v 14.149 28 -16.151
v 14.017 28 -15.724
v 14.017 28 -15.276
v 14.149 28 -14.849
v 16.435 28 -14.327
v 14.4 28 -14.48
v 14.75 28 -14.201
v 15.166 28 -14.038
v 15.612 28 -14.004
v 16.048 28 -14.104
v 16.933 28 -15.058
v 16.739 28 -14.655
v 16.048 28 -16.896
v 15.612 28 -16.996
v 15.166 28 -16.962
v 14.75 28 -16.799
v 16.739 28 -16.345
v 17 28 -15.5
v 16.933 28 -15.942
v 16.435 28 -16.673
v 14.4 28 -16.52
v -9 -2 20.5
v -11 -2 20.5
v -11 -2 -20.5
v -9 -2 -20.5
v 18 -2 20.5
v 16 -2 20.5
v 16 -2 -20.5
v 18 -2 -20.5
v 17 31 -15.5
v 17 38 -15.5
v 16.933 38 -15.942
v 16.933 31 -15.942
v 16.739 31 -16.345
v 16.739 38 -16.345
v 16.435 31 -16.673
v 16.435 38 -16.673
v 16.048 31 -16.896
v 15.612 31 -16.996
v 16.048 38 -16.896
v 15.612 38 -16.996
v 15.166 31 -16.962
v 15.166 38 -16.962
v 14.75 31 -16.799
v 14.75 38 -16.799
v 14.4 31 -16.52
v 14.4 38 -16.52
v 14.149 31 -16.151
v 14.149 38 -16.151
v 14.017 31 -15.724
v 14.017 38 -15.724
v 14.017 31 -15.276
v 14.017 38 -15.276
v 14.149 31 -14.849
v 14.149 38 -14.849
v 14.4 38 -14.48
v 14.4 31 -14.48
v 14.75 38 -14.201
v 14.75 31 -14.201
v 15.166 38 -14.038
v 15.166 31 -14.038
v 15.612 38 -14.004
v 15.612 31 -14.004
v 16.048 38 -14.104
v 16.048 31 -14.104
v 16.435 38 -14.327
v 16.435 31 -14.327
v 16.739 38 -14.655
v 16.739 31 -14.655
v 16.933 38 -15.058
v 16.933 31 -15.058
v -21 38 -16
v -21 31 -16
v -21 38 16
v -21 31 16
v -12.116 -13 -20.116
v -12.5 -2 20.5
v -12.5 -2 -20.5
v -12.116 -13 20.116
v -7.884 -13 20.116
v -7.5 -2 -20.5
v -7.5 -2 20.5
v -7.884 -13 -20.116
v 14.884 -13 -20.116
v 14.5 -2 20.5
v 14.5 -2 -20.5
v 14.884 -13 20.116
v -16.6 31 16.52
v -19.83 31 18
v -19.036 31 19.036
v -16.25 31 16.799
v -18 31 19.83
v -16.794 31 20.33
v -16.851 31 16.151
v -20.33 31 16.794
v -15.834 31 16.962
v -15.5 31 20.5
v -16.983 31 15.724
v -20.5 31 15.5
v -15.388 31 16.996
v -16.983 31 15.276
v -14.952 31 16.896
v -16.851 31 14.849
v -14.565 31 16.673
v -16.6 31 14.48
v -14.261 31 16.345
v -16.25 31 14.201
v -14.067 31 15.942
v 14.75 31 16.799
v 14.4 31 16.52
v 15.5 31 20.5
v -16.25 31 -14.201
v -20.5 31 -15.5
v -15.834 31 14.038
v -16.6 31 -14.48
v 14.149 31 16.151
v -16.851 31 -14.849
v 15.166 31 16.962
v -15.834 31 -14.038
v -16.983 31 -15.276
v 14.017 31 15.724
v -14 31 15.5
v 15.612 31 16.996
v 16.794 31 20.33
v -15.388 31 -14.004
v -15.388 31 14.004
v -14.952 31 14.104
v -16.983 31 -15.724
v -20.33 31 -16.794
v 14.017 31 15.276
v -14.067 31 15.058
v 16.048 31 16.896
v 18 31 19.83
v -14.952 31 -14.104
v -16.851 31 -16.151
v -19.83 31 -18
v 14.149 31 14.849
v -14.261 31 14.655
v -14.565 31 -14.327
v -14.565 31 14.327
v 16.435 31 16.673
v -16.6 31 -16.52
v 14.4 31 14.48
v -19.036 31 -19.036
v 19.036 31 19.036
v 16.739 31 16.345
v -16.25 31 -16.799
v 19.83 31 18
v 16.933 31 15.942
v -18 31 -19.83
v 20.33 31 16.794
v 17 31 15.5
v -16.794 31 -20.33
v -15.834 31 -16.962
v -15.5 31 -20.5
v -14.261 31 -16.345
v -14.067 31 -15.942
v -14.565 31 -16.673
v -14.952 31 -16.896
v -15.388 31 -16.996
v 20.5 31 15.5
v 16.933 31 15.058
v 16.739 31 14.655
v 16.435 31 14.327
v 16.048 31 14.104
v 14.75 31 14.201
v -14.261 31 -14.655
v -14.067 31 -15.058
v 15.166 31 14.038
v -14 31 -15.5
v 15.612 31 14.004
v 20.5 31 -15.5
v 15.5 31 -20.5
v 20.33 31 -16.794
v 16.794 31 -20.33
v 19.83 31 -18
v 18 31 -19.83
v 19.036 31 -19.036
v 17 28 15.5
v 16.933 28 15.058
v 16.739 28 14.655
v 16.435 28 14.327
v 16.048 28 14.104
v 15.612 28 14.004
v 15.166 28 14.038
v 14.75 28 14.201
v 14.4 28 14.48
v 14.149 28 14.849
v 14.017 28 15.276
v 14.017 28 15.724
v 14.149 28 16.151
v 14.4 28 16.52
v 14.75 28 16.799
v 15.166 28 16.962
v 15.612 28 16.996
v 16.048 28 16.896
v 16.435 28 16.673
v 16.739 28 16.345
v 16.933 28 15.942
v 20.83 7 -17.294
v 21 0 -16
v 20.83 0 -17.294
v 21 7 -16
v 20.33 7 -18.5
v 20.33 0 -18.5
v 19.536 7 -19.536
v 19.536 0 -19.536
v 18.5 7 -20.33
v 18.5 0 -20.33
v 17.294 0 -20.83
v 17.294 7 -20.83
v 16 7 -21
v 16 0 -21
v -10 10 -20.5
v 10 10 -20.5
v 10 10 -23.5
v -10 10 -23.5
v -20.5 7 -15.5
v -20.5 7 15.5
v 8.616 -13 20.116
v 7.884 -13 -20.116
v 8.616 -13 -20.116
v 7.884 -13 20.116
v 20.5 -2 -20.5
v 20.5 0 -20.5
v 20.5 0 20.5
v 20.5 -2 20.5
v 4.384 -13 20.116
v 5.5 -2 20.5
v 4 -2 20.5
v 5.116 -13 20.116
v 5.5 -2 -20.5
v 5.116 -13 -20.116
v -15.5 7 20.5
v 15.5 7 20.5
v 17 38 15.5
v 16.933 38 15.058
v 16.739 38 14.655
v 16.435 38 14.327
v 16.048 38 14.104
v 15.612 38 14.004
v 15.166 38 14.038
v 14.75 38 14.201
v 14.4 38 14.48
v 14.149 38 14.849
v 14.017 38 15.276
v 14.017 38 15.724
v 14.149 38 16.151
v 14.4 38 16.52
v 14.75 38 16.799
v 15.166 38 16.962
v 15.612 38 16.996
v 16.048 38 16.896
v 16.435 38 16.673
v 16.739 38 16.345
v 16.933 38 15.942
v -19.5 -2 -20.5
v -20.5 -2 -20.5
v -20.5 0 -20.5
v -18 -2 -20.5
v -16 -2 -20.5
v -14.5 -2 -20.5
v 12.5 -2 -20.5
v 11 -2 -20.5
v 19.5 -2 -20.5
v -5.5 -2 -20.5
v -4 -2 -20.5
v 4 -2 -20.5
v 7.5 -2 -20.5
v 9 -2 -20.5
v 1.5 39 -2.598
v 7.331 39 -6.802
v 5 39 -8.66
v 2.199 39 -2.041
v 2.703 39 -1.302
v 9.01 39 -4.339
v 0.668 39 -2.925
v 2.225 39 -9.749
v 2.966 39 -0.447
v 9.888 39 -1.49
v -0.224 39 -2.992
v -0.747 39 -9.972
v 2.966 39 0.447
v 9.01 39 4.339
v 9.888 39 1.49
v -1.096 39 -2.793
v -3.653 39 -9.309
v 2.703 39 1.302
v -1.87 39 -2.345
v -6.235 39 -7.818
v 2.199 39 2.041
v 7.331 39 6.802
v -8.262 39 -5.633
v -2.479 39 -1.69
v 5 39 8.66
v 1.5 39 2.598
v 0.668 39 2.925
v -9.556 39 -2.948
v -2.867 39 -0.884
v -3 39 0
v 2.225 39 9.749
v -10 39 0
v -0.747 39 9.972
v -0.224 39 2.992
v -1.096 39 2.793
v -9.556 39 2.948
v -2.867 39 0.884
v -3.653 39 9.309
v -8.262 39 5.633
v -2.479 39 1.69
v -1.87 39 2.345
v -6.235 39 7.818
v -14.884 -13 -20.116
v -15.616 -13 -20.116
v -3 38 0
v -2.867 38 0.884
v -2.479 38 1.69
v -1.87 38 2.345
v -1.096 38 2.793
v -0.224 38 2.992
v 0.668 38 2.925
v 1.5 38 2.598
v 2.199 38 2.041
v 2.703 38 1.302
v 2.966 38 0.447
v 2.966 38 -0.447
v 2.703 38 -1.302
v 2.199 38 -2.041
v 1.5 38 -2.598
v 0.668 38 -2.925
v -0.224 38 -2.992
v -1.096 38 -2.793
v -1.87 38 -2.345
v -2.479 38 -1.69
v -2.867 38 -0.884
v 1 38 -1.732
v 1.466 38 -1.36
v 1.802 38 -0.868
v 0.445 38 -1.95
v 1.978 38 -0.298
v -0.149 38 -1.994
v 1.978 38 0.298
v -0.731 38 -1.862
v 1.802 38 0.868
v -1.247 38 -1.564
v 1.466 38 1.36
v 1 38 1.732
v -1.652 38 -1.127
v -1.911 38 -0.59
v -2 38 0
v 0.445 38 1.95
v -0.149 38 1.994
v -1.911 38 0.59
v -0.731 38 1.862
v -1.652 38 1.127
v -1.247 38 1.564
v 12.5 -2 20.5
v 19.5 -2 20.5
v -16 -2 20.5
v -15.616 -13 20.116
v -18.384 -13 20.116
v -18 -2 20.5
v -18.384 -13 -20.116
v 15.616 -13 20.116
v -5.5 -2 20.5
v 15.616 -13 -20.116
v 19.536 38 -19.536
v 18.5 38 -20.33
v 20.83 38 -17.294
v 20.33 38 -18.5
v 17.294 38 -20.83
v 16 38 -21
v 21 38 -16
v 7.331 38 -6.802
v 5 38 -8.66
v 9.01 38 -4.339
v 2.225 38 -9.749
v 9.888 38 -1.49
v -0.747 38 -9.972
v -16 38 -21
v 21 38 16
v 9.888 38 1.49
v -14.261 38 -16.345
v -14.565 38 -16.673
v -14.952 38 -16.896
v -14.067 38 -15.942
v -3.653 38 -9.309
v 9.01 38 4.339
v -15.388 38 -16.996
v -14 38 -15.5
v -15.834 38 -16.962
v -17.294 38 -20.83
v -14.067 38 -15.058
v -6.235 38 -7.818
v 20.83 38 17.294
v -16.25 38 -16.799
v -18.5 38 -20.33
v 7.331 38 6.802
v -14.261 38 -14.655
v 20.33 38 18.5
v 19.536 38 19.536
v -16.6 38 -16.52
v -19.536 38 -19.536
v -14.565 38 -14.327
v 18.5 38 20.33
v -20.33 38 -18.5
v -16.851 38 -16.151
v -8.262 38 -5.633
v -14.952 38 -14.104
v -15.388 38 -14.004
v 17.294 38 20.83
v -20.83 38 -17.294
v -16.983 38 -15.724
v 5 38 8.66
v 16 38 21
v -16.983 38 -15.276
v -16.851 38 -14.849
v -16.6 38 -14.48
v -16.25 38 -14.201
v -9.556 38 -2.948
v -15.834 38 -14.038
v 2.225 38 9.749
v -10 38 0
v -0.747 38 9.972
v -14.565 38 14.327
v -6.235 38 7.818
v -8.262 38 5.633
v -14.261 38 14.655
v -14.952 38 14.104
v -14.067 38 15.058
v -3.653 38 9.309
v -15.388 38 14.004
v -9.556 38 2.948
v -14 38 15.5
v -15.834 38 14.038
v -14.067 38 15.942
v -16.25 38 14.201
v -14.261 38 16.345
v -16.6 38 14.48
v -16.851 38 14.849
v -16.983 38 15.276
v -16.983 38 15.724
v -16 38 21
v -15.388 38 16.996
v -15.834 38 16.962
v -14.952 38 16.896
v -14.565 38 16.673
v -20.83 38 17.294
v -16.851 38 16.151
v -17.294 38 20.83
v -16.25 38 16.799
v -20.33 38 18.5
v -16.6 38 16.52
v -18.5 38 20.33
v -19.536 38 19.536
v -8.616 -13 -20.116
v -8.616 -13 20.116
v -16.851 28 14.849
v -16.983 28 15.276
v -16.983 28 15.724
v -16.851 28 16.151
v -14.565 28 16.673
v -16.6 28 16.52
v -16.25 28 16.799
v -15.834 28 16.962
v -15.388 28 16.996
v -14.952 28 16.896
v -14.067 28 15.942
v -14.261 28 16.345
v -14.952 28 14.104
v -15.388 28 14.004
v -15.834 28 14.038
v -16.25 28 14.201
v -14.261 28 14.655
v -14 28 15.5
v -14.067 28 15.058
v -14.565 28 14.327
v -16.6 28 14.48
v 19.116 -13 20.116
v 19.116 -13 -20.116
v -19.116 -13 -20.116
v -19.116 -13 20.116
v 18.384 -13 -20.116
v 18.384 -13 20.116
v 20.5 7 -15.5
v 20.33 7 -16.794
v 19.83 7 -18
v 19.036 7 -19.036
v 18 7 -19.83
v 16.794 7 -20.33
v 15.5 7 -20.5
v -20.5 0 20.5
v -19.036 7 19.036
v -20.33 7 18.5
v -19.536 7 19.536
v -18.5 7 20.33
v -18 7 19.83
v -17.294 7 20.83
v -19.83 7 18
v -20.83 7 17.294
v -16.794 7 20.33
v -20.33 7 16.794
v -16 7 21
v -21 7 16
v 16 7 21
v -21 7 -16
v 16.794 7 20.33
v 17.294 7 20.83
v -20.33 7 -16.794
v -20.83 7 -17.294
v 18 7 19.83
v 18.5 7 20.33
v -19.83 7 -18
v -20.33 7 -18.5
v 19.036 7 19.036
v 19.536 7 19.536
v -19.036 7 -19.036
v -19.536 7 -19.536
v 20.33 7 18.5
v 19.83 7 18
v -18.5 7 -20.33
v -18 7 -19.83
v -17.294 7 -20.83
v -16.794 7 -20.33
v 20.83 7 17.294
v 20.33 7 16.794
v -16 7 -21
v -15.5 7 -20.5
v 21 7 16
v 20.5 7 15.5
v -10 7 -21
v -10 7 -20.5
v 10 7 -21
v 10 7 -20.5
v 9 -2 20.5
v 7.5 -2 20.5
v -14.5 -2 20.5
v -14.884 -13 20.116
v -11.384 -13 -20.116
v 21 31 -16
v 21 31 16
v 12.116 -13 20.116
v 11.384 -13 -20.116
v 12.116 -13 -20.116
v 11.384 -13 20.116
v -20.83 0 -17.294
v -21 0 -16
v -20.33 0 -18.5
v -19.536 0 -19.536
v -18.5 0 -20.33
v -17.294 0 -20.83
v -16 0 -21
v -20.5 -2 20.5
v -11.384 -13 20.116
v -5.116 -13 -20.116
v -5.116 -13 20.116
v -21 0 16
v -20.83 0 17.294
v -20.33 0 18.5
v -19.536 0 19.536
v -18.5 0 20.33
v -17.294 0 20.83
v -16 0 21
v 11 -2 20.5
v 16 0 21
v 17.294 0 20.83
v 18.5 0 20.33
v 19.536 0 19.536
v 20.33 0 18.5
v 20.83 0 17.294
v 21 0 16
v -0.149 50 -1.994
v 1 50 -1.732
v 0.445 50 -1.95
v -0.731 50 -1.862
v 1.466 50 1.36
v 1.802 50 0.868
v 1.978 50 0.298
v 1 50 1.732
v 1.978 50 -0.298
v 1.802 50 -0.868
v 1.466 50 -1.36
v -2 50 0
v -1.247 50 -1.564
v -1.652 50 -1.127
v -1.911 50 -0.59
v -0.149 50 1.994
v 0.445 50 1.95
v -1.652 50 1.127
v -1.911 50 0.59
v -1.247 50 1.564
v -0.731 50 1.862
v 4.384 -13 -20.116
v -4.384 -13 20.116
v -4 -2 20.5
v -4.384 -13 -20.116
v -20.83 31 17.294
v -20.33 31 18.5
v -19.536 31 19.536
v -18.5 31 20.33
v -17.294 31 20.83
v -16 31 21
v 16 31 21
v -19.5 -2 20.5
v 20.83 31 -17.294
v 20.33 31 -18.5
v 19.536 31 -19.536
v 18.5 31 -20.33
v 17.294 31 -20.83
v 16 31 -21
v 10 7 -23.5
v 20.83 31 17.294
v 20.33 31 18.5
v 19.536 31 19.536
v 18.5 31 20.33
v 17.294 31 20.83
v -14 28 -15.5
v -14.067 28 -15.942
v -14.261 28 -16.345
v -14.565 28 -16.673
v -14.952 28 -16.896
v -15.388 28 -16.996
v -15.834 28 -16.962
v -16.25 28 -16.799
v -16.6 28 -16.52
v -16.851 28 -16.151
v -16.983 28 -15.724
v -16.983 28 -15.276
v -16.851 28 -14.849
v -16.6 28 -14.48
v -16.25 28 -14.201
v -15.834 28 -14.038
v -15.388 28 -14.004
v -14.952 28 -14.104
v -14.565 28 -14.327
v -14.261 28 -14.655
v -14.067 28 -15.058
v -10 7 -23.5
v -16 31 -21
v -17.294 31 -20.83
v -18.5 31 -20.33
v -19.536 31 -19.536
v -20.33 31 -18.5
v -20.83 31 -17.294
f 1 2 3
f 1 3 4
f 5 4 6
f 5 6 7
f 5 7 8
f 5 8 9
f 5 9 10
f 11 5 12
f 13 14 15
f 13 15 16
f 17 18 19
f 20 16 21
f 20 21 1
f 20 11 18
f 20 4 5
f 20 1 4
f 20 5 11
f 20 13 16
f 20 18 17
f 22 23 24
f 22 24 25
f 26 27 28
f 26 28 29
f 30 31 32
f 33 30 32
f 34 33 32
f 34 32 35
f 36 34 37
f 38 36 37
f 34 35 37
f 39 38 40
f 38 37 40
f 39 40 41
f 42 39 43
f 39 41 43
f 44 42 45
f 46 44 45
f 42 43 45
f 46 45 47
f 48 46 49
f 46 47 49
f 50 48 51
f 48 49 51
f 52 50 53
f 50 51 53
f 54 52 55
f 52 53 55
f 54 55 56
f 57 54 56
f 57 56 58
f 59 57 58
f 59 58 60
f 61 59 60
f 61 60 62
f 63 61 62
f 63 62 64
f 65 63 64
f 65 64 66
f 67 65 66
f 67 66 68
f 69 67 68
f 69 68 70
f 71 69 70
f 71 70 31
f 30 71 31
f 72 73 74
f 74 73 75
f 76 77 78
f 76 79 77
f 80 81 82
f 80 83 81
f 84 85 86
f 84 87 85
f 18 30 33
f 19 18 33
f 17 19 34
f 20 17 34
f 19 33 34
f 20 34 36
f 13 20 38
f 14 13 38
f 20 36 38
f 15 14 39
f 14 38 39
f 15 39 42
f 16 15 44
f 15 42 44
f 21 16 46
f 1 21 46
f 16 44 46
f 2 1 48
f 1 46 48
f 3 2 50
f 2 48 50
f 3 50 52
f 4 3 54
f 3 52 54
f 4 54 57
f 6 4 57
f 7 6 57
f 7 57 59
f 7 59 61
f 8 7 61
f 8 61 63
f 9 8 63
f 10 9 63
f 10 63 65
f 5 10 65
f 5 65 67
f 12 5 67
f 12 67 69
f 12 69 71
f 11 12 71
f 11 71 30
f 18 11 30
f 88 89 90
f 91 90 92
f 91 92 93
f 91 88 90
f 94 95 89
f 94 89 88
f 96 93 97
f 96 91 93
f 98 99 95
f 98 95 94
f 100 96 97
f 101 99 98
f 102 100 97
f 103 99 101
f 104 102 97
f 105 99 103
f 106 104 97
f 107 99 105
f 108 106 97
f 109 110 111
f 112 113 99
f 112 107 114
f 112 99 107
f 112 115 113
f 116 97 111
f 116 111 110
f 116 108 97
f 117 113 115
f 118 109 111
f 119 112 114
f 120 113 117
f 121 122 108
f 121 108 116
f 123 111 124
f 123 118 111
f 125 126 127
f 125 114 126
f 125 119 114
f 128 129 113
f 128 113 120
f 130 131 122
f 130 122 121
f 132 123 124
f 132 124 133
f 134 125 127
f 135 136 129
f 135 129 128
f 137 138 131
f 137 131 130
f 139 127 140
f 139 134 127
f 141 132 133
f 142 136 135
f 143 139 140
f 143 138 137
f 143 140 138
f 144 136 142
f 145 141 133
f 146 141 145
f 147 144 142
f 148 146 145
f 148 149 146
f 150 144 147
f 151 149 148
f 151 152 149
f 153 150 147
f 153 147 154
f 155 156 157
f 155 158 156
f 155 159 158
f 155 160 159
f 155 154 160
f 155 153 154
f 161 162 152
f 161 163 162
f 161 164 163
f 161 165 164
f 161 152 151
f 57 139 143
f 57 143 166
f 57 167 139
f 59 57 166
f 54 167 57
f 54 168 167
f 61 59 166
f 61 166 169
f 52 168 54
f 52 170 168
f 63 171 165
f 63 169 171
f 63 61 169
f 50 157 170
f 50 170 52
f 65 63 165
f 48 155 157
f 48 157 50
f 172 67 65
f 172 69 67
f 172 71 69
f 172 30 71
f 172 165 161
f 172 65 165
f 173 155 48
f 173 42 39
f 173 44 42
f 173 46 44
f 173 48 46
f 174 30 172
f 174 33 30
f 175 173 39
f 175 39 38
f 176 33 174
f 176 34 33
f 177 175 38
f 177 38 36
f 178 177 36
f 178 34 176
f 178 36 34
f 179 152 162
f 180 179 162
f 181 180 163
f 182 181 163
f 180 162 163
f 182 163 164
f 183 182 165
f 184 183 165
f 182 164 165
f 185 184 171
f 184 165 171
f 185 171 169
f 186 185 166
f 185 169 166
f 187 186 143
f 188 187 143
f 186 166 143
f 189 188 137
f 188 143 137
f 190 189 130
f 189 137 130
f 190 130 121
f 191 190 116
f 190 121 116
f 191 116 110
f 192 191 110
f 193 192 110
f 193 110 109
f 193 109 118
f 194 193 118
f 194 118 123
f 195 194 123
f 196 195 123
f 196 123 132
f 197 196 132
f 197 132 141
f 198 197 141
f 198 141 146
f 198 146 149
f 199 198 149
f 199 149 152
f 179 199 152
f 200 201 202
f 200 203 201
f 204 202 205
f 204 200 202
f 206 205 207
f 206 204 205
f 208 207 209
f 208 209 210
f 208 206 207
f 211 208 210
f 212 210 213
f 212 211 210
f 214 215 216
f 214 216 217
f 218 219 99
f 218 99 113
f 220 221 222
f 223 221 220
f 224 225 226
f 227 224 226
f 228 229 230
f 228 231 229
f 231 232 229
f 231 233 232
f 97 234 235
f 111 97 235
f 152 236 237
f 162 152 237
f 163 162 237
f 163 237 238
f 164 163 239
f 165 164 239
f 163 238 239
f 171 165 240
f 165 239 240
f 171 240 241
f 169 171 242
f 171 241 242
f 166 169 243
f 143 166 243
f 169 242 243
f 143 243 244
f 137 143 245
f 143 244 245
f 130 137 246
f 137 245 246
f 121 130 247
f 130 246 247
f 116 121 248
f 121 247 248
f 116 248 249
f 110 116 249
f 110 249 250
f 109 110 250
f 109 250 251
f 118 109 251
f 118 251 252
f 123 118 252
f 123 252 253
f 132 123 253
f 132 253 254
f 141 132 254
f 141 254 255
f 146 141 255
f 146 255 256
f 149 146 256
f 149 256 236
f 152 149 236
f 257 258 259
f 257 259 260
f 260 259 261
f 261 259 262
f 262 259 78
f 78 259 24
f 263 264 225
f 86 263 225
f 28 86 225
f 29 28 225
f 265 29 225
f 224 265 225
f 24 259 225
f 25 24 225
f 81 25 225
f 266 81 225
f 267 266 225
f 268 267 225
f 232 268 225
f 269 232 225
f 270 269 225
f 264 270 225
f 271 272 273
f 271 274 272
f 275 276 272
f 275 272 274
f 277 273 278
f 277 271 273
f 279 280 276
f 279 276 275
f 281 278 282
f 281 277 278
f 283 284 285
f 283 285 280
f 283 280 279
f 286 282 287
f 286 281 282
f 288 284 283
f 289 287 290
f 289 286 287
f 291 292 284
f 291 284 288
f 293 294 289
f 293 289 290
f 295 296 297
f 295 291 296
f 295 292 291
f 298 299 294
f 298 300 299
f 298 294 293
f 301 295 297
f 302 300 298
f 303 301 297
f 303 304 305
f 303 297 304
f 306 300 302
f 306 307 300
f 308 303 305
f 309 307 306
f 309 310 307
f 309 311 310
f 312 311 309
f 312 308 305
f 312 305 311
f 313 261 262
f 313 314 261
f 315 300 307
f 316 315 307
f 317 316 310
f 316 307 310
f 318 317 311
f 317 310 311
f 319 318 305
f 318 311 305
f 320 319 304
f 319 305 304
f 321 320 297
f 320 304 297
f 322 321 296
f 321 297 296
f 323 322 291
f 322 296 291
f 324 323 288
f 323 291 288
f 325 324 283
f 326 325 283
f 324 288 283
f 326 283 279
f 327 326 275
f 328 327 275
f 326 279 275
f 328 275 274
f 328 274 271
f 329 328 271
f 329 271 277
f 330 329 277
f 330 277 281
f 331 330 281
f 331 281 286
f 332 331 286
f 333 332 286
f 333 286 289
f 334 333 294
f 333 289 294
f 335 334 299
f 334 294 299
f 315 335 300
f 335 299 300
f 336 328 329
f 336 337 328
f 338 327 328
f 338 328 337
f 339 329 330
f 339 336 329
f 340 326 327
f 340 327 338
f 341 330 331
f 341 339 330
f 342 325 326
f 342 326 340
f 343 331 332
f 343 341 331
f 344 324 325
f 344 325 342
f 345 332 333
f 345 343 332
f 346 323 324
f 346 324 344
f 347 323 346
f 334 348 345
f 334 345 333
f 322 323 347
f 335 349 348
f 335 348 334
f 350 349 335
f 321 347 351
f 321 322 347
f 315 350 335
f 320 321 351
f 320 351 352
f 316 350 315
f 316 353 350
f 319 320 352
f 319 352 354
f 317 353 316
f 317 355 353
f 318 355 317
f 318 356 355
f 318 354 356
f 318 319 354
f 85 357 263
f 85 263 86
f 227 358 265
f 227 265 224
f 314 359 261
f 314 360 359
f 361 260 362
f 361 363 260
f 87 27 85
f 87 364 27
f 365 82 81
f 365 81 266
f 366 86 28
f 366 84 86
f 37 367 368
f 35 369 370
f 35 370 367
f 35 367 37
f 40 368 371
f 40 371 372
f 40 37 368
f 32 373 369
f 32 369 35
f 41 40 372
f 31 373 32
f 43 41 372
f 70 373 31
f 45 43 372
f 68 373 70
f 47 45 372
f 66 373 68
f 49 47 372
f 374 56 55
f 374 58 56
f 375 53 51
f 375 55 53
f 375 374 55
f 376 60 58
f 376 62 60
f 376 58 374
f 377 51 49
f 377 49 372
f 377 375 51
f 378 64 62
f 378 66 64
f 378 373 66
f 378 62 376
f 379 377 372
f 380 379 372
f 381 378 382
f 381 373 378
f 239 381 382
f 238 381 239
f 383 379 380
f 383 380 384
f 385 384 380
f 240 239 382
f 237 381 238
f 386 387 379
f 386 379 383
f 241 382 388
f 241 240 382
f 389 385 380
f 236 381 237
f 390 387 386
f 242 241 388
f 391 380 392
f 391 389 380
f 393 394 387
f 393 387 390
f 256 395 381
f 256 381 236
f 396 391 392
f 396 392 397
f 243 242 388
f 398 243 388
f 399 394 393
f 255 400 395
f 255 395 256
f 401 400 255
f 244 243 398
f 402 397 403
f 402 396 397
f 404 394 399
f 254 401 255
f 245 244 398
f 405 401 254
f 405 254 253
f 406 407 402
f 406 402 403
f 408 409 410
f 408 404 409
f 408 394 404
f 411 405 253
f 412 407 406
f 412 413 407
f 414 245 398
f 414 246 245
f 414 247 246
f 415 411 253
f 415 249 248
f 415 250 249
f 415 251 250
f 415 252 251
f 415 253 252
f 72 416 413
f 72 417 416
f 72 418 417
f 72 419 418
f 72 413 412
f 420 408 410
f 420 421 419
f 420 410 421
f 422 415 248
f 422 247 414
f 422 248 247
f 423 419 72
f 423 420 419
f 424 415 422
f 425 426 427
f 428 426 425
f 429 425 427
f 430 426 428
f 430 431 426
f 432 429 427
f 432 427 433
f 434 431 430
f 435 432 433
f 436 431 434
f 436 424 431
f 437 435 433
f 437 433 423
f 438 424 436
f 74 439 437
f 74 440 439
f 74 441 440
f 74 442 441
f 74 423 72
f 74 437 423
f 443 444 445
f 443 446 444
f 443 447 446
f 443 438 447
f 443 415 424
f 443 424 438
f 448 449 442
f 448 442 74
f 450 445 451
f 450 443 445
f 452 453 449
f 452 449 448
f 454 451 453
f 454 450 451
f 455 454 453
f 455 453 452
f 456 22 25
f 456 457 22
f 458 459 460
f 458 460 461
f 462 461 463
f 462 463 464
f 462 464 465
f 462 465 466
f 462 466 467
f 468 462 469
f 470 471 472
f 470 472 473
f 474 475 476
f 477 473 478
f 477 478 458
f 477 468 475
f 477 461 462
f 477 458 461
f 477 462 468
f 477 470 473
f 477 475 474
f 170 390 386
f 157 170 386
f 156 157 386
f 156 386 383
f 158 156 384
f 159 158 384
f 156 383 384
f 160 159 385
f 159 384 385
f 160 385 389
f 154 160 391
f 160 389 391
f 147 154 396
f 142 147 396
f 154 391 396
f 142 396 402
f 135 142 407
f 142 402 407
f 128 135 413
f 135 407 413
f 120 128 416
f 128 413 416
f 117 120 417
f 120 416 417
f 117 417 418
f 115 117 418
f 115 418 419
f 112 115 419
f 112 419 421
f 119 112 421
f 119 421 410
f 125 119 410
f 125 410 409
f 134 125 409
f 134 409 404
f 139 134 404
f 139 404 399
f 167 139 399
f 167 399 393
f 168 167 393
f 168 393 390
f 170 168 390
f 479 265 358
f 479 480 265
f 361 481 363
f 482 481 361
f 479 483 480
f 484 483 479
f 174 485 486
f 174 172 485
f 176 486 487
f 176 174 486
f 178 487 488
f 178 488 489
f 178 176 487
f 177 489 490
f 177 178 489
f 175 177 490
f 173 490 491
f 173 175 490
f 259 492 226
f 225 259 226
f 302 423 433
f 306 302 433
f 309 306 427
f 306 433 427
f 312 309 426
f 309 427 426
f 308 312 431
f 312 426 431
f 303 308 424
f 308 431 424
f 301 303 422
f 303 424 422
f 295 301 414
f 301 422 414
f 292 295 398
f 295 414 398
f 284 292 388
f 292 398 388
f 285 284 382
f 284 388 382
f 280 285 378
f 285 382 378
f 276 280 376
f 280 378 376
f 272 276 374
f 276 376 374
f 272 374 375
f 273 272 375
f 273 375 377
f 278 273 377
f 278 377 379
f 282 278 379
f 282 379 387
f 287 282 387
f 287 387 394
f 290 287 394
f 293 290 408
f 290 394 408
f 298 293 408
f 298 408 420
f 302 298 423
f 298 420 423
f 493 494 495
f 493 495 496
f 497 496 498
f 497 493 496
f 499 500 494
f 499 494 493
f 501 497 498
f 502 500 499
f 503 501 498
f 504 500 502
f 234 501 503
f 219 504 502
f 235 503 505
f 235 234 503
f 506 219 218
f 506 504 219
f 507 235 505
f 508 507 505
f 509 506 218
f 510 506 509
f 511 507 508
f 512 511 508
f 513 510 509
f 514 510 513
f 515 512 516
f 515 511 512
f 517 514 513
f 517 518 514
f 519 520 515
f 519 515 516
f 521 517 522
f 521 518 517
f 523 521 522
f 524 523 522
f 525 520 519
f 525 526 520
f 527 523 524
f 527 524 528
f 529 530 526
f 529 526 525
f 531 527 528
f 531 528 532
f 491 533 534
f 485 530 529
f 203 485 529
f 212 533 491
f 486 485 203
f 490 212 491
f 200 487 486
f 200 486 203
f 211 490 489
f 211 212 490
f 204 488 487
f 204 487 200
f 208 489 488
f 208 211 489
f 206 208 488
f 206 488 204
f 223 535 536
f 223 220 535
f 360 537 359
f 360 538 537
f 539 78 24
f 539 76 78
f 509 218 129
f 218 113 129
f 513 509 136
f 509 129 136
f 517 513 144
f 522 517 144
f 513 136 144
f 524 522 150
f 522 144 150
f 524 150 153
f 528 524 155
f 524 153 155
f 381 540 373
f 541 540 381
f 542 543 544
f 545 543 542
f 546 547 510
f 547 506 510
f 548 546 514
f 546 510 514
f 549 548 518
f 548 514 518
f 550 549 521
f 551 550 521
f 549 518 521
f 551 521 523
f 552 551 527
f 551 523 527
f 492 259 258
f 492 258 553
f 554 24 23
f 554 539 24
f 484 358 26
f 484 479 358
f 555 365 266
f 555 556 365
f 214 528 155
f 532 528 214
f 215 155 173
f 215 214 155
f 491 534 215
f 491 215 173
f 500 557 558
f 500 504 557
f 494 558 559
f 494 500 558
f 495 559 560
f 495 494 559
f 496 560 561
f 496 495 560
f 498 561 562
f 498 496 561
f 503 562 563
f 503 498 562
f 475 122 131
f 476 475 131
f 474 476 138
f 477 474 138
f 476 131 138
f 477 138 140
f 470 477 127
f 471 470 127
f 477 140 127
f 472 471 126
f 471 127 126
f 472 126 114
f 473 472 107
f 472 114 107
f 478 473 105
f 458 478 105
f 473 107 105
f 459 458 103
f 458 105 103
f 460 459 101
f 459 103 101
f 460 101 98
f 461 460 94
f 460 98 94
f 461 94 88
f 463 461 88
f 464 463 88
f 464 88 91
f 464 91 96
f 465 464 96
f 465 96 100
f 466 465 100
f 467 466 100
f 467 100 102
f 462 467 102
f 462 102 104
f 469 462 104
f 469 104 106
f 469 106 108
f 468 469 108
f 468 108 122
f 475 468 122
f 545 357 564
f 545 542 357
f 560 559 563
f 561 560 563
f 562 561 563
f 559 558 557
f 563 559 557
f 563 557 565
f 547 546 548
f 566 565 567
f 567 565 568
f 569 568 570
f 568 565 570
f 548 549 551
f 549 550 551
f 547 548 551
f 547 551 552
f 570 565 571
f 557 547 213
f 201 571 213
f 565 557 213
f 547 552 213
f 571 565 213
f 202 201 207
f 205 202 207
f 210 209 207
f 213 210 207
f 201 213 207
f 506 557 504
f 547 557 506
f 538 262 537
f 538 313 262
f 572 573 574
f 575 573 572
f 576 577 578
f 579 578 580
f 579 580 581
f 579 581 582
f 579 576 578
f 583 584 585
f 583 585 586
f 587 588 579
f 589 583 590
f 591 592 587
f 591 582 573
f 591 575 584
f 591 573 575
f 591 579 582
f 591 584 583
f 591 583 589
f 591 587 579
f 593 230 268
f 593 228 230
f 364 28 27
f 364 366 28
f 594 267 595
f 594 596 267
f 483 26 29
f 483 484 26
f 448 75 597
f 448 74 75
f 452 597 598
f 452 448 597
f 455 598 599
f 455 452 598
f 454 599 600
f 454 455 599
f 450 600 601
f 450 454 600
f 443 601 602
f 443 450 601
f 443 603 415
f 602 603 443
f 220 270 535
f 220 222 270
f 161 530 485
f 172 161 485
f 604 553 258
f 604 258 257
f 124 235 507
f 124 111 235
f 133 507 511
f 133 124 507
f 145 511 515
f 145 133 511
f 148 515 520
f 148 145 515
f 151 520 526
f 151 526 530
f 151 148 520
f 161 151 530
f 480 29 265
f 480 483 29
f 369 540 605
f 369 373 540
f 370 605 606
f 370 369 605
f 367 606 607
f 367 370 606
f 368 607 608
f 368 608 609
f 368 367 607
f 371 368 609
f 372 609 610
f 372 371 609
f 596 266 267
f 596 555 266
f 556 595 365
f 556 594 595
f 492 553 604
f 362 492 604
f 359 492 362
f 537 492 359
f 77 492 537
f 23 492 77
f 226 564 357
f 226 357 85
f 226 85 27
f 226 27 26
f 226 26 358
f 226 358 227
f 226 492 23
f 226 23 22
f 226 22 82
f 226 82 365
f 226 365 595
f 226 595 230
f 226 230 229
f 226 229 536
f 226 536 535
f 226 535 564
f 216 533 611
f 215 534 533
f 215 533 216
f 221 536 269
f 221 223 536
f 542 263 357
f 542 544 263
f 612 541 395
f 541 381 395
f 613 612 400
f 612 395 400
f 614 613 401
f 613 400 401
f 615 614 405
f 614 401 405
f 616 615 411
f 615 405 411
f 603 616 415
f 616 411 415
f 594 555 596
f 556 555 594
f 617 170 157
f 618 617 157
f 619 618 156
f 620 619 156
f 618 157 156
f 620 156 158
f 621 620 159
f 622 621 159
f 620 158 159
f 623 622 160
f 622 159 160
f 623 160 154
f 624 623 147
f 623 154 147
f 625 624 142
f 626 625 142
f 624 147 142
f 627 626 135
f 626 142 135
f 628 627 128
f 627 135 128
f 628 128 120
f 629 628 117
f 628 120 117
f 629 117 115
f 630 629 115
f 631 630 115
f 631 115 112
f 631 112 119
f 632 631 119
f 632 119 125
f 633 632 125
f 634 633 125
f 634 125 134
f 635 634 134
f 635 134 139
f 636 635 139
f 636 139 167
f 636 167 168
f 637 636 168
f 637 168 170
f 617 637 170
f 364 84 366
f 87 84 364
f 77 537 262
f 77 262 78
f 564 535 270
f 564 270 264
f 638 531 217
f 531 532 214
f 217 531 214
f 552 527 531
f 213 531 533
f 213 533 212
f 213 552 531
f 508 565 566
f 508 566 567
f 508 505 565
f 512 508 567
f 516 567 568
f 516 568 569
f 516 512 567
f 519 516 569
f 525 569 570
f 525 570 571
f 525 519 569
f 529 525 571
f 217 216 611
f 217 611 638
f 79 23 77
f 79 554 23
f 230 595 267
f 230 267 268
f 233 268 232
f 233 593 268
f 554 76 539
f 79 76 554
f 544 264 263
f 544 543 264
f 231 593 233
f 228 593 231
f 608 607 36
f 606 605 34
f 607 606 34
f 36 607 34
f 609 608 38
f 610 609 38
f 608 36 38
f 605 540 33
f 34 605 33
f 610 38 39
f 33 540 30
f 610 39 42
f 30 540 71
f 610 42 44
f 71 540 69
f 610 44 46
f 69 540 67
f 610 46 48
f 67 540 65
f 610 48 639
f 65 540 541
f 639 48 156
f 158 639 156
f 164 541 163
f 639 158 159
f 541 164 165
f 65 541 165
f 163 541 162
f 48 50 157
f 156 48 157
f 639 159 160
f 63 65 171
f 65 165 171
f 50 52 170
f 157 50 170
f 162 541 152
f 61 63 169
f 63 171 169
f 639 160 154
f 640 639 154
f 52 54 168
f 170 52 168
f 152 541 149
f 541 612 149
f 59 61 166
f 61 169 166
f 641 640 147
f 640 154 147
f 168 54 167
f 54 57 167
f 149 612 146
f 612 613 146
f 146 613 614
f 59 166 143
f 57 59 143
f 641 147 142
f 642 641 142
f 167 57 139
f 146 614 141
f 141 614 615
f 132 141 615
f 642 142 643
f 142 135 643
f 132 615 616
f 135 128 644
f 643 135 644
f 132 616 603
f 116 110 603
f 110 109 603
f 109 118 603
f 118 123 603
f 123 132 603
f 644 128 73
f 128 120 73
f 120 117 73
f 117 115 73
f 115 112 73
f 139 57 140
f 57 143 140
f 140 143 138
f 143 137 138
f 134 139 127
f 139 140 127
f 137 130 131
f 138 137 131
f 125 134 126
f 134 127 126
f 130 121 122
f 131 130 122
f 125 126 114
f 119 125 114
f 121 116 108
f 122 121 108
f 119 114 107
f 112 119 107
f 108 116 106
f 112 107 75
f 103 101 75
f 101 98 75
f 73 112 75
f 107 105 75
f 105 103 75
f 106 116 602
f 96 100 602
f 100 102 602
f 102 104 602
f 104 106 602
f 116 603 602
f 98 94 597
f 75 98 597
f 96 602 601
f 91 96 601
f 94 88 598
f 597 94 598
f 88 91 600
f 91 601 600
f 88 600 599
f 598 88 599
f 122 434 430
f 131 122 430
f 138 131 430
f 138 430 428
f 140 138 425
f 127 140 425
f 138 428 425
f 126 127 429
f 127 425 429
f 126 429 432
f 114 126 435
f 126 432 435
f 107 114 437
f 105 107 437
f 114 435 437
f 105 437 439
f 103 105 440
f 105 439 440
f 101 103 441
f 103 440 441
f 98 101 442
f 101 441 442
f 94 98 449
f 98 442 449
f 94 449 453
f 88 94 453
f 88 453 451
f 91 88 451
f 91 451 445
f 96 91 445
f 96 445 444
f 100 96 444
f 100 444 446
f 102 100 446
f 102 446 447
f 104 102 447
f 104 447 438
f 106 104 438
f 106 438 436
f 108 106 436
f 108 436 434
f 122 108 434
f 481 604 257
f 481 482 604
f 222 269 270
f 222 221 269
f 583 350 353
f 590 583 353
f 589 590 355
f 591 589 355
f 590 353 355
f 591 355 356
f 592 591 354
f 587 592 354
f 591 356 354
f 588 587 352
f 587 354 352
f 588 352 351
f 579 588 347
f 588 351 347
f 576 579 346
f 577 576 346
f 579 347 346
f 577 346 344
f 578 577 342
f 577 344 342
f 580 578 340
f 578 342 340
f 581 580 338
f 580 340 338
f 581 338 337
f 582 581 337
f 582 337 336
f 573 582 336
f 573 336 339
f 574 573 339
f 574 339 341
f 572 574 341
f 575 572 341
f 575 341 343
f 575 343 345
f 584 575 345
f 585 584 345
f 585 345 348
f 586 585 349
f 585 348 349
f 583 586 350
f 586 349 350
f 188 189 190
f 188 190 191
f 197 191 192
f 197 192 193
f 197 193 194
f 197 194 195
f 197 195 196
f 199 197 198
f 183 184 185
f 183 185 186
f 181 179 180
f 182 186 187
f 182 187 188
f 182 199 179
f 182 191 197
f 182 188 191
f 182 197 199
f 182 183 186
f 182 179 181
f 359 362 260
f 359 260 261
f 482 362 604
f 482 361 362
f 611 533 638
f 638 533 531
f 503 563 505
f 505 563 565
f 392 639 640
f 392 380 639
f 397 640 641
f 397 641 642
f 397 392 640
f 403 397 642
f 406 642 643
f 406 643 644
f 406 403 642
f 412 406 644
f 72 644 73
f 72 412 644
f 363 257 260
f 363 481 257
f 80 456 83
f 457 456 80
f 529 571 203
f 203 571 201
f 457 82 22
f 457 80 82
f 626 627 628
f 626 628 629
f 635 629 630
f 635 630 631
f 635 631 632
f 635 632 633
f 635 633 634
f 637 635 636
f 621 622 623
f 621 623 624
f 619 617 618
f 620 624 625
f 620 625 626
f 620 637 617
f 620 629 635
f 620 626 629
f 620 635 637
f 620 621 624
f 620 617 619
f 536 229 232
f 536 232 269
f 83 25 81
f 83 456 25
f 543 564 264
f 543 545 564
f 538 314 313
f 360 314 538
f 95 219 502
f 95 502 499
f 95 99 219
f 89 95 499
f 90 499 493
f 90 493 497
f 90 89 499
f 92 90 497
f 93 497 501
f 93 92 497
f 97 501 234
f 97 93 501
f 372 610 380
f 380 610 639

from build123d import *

# Parameters (mm, degrees)
SKETCH1_W       = 42
SKETCH1_H       = 42
EXTRUDE1_DEPTH  = 7
FILLET1_R       = 5
SKETCH2_W       = 41
SKETCH2_H       = 41
EXTRUDE2_DEPTH  = 24
FILLET3_R       = 5
SKETCH3_W       = 42
SKETCH3_H       = 42
EXTRUDE3_DEPTH  = 7
FILLET4_R       = 5
SKETCH4_R       = 10
EXTRUDE4_DEPTH  = 1
SKETCH5_R       = 3
EXTRUDE5_DEPTH  = 1
SKETCH6_R       = 2
EXTRUDE7_DEPTH  = 12
SKETCH7_W       = 20
SKETCH7_H       = 3
EXTRUDE8_DEPTH  = 3
SKETCH8_R       = 1.5
EXTRUDE9_DEPTH  = 10
SKETCH9_W       = 41
SKETCH9_H       = 41
EXTRUDE11_DEPTH = 2
SKETCH10_W      = 1.5
SKETCH10_H      = 41
EXTRUDE12_DEPTH = 11
EXTRUDE12_TAPER = 2


with BuildPart() as part:
    # Sketch1 → Extrude1 (new body)
    with BuildSketch(Plane(origin=(0, 0, 0), x_dir=(1, 0, 0), z_dir=(0, 1, 0))):
        Rectangle(SKETCH1_W, SKETCH1_H)
    extrude(amount=EXTRUDE1_DEPTH)

    # Fillet1
    fillet1_edges = [part.edges().sort_by_distance(p)[0] for p in [
        (21, 3.5, 21),
        (-21, 3.5, 21),
        (-21, 3.5, -21),
        (21, 3.5, -21),
    ]]
    fillet(fillet1_edges, radius=FILLET1_R)



with BuildPart() as body_2:
    # Sketch2 → Extrude2 (new body)
    with BuildSketch(Plane(origin=(0, 7, 0), x_dir=(1, 0, 0), z_dir=(0, 1, 0))):
        Rectangle(SKETCH2_W, SKETCH2_H)
    extrude(amount=EXTRUDE2_DEPTH)

    # Fillet3
    fillet3_edges = [body_2.edges().sort_by_distance(p)[0] for p in [
        (-20.5, 19, -20.5),
        (20.5, 19, -20.5),
        (20.5, 19, 20.5),
        (-20.5, 19, 20.5),
    ]]
    fillet(fillet3_edges, radius=FILLET3_R)


with BuildPart() as body_3:
    # Sketch3 → Extrude3 (new body)
    with BuildSketch(Plane(origin=(0, 31, 0), x_dir=(-1, 0, 0), z_dir=(0, 1, 0))):
        Rectangle(SKETCH3_W, SKETCH3_H)
    extrude(amount=EXTRUDE3_DEPTH)

    # Fillet4
    fillet4_edges = [body_3.edges().sort_by_distance(p)[0] for p in [
        (21, 34.5, 21),
        (-21, 34.5, 21),
        (-21, 34.5, -21),
        (21, 34.5, -21),
    ]]
    fillet(fillet4_edges, radius=FILLET4_R)

    # Sketch4 → Extrude4 (add)
    with BuildSketch(Plane(origin=(0, 38, 0), x_dir=(-1, 0, 0), z_dir=(0, 1, 0))):
        Circle(SKETCH4_R)
    extrude(amount=EXTRUDE4_DEPTH)

    # Sketch5 → Extrude5 (cut)
    with BuildSketch(Plane(origin=(0, 39, 0), x_dir=(-1, 0, 0), z_dir=(0, 1, 0))):
        Circle(SKETCH5_R)
    extrude(amount=-EXTRUDE5_DEPTH, mode=Mode.SUBTRACT)

    # Sketch6 → Extrude7 (add)
    with BuildSketch(Plane(origin=(0, 38, 0), x_dir=(-1, 0, 0), z_dir=(0, 1, 0))):
        Circle(SKETCH6_R)
    extrude(amount=EXTRUDE7_DEPTH)


with BuildPart() as part_1:
    add(part.part)

    add(body_2.part)  # Extrude8 merges body 2
    # Sketch7 → Extrude8 (add)
    with BuildSketch(Plane(origin=(0, 0, -20.5), x_dir=(-1, 0, 0), z_dir=(0, 0, -1))):
        with Locations((0, 8.5)):
            Rectangle(SKETCH7_W, SKETCH7_H)
    extrude(amount=EXTRUDE8_DEPTH)


with BuildPart() as extrude9_tool:
    # Sketch8 → Extrude9 (new body)
    with BuildSketch(Plane(origin=(0, 38, 0), x_dir=(1, 0, 0), z_dir=(0, 1, 0))):
        with Locations((15.5, 15.5)):
            Circle(SKETCH8_R)
        with Locations((-15.5, 15.5)):
            Circle(SKETCH8_R)
        with Locations((-15.5, -15.5)):
            Circle(SKETCH8_R)
        with Locations((15.5, -15.5)):
            Circle(SKETCH8_R)
    extrude(amount=-EXTRUDE9_DEPTH)


with BuildPart() as part_2:
    add(part_1.part)

    # Extrude9: cut by extrude9_tool
    add(extrude9_tool.part, mode=Mode.SUBTRACT)


with BuildPart() as body_3_1:
    add(body_3.part)

    # Extrude9: cut by extrude9_tool
    add(extrude9_tool.part, mode=Mode.SUBTRACT)


with BuildPart() as body_3_2:
    # Sketch9 → Extrude11 (new body)
    with BuildSketch(Plane.XZ):
        Rectangle(SKETCH9_W, SKETCH9_H)
    extrude(amount=EXTRUDE11_DEPTH)

    # Sketch10 → Extrude12 (add)
    with BuildSketch(Plane.XZ.offset(2)):
        with Locations((-18.75, 0)):
            Rectangle(SKETCH10_W, SKETCH10_H)
        with Locations((-15.25, 0)):
            Rectangle(SKETCH10_W, SKETCH10_H)
        with Locations((-11.75, 0)):
            Rectangle(SKETCH10_W, SKETCH10_H)
        with Locations((-8.25, 0)):
            Rectangle(SKETCH10_W, SKETCH10_H)
        with Locations((-4.75, 0)):
            Rectangle(SKETCH10_W, SKETCH10_H)
        with Locations((18.75, 0)):
            Rectangle(SKETCH10_W, SKETCH10_H)
        with Locations((15.25, 0)):
            Rectangle(SKETCH10_W, SKETCH10_H)
        with Locations((11.75, 0)):
            Rectangle(SKETCH10_W, SKETCH10_H)
        with Locations((8.25, 0)):
            Rectangle(SKETCH10_W, SKETCH10_H)
        with Locations((4.75, 0)):
            Rectangle(SKETCH10_W, SKETCH10_H)
    extrude(amount=EXTRUDE12_DEPTH, taper=EXTRUDE12_TAPER)


solid = Compound([part_2.part, body_3_1.part, body_3_2.part])
